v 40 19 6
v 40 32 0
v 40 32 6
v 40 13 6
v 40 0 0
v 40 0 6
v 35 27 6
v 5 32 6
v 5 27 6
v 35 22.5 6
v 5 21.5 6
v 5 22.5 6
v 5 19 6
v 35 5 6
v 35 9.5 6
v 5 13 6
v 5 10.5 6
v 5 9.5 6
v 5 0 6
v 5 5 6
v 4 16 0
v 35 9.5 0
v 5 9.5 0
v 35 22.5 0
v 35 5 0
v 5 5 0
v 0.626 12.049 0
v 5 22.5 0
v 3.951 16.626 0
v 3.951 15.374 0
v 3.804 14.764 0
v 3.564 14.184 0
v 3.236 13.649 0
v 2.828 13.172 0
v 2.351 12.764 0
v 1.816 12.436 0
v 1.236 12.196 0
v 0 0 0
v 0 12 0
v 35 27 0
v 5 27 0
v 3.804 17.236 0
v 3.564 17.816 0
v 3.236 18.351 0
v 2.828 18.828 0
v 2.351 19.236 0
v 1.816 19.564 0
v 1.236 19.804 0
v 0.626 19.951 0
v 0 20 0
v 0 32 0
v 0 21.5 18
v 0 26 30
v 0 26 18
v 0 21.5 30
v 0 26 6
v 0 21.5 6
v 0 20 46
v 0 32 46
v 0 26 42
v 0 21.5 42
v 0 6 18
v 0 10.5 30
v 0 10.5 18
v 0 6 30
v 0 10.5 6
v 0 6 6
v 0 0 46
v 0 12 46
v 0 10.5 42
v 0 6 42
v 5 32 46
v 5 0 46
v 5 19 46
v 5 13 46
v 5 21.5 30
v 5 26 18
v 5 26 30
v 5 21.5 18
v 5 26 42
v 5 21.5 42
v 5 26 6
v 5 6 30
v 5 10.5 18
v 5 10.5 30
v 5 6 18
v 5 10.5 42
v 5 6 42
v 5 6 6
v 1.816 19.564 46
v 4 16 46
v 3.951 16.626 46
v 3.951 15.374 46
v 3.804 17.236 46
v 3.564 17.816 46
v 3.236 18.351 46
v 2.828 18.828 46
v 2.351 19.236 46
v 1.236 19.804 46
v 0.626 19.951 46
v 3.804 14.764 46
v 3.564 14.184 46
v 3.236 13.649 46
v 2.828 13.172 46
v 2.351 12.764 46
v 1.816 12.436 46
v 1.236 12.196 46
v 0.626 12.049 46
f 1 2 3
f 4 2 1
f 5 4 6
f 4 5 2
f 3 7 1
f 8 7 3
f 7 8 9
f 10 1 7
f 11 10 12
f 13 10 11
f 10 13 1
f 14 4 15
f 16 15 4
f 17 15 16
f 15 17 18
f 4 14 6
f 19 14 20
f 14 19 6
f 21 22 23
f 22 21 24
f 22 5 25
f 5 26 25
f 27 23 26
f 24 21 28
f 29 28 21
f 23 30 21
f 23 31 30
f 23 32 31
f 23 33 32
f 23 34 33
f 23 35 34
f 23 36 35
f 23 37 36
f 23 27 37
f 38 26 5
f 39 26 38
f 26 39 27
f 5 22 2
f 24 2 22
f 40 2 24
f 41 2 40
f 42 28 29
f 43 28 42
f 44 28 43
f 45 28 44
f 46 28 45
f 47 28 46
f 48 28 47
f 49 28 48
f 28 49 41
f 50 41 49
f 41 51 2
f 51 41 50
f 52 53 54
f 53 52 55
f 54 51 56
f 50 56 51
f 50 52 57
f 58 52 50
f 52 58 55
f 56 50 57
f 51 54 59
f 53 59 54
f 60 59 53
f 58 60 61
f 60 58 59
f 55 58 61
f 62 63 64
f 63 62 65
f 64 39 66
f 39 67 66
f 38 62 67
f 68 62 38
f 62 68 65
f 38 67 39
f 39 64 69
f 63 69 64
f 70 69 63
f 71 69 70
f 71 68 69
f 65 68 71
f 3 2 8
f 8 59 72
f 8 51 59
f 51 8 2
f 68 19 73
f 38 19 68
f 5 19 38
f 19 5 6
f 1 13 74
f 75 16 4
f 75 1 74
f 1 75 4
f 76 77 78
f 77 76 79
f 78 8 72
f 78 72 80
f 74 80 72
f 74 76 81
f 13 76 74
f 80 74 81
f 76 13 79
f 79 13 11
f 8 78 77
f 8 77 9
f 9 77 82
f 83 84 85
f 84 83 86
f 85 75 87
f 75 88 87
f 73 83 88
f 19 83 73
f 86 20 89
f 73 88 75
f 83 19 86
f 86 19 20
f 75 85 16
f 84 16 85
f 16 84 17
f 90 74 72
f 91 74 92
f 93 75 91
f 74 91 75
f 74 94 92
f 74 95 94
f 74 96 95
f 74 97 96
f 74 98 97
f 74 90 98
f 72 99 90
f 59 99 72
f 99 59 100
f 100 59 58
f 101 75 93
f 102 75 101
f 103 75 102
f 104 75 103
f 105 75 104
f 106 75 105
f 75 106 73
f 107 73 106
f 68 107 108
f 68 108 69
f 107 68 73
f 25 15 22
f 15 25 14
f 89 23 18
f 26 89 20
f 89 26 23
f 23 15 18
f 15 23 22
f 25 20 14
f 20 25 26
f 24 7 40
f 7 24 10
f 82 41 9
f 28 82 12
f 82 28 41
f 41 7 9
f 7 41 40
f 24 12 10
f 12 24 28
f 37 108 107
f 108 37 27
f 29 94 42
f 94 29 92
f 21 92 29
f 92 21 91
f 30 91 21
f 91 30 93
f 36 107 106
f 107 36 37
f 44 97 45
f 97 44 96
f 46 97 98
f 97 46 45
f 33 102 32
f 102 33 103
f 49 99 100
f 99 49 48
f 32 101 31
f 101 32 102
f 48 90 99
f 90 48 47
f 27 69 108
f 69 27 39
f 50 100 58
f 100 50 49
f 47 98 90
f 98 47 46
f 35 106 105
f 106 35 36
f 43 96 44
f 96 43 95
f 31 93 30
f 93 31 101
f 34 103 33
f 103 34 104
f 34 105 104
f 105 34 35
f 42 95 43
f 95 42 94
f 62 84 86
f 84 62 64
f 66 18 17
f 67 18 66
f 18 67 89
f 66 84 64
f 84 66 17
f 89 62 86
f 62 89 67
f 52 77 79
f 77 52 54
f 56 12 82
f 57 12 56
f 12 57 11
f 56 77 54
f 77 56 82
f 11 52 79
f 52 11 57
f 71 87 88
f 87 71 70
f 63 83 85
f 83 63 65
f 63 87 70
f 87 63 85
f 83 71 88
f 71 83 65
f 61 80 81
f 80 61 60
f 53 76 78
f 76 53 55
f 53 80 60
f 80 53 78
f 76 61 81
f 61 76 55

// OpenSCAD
// file: gear.scad
module gear (
	mm_per_tooth    = 3,    //this is the "circular pitch", the circumference of the pitch circle divided by the number of teeth
	number_of_teeth = 11,   //total number of teeth around the entire perimeter
	thickness       = 6,    //thickness of gear in mm
	hole_diameter   = 3,    //diameter of the hole in the center, in mm
	twist           = 0,    //teeth rotate this many degrees from bottom of gear to top.  360 makes the gear a screw with each thread going around once
	teeth_to_hide   = 0,    //number of teeth to delete to make this only a fraction of a circle
	pressure_angle  = 28,   //Controls how straight or bulged the tooth sides are. In degrees.
	clearance       = 0.0,  //gap between top of a tooth on one gear and bottom of valley on a meshing gear (in millimeters)
	backlash        = 0.0   //gap between two meshing teeth, in the direction along the circumference of the pitch circle
) {
	pi = 3.1415926;
	p  = mm_per_tooth * number_of_teeth / pi / 2;  //radius of pitch circle
	c  = p + mm_per_tooth / pi - clearance;       //radius of outer circle
	b  = p*cos(pressure_angle);                    //radius of base circle
	r  = p-(c-p)-clearance;                        //radius of root circle
	t  = mm_per_tooth/2-backlash/2;                //tooth thickness at pitch circle
	k  = -iang(b, p) - t/2/p/pi*180;
    {             //angle to where involute meets base circle on each side of tooth
		difference() {
			for (i = [0:number_of_teeth-teeth_to_hide-1] )
				rotate([0,0,i*360/number_of_teeth])
					linear_extrude(height = thickness, center = true, convexity = 10, twist = twist)
						polygon(
							points=[
								[0, -hole_diameter/10],
								polar(r, -181/number_of_teeth),
								polar(r, r<b ? k : -180/number_of_teeth),
								q7(0/5,r,b,c,k, 1),q7(1/5,r,b,c,k, 1),q7(2/5,r,b,c,k, 1),q7(3/5,r,b,c,k, 1),q7(4/5,r,b,c,k, 1),q7(5/5,r,b,c,k, 1),
								q7(5/5,r,b,c,k,-1),q7(4/5,r,b,c,k,-1),q7(3/5,r,b,c,k,-1),q7(2/5,r,b,c,k,-1),q7(1/5,r,b,c,k,-1),q7(0/5,r,b,c,k,-1),
								polar(r, r<b ? -k : 180/number_of_teeth),
								polar(r, 181/number_of_teeth)
							],
 							paths=[[0,1,2,3,4,5,6,7,8,9,10,11,12,13,14,15,16]]
						);
			cylinder(h=2*thickness+1, r=hole_diameter/2, center=true, $fn=20);
		}
	}
};	
//these 4 functions are used by gear
function polar(r,theta)   = r*[sin(theta), cos(theta)];                            //convert polar to cartesian coordinates
function iang(r1,r2)      = sqrt((r2/r1)*(r2/r1) - 1)/3.1415926*180 - acos(r1/r2); //unwind a string this many degrees to go from radius r1 to radius r2
function q7(f,r,b,r2,t,s) = q6(b,s,t,(1-f)*max(b,r)+f*r2);                         //radius a fraction f up the curved side of the tooth 
function q6(b,s,t,d)      = polar(d,s*(iang(b,d)+t));                              //point at radius d on the involute curve

//a rack, which is a straight line with teeth (the same as a segment from a giant gear with a huge number of teeth).
//The "pitch circle" is a line along the X axis.
module rack (
	mm_per_tooth    = 3,    //this is the "circular pitch", the circumference of the pitch circle divided by the number of teeth
	number_of_teeth = 11,   //total number of teeth along the rack
	thickness       = 6,    //thickness of rack in mm (affects each tooth)
	height          = 120,   //height of rack in mm, from tooth top to far side of rack.
	pressure_angle  = 28,   //Controls how straight or bulged the tooth sides are. In degrees.
	backlash        = 0.0   //gap between two meshing teeth, in the direction along the circumference of the pitch circle
) {
	pi = 3.1415926;
	a = mm_per_tooth / pi; //addendum
	t = a*cos(pressure_angle)-1;         //tooth side is tilted so top/bottom corners move this amount
		for (i = [0:number_of_teeth-1] )
			translate([i*mm_per_tooth,0,0])
				linear_extrude(height = thickness, center = true, convexity = 10)
					polygon(
						points=[
							[-mm_per_tooth * 3/4,                 a-height],
							[-mm_per_tooth * 3/4 - backlash,     -a],
							[-mm_per_tooth * 1/4 + backlash - t, -a],
							[-mm_per_tooth * 1/4 + backlash + t,  a],
							[ mm_per_tooth * 1/4 - backlash - t,  a],
							[ mm_per_tooth * 1/4 - backlash + t, -a],
							[ mm_per_tooth * 3/4 + backlash,     -a],
							[ mm_per_tooth * 3/4,                 a-height],
						],
						paths=[[0,1,2,3,4,5,6,7]]
					);
};	

//These 5 functions let the user find the derived dimensions of the gear.
//A gear fits within a circle of radius outer_radius, and two gears should have
//their centers separated by the sum of their pictch_radius.
function circular_pitch  (mm_per_tooth=3) = mm_per_tooth;                     //tooth density expressed as "circular pitch" in millimeters
function diametral_pitch (mm_per_tooth=3) = 3.1415926 / mm_per_tooth;         //tooth density expressed as "diametral pitch" in teeth per millimeter
function module_value    (mm_per_tooth=3) = mm_per_tooth / pi;                //tooth density expressed as "module" or "modulus" in millimeters
function pitch_radius    (mm_per_tooth=3,number_of_teeth=11) = mm_per_tooth * number_of_teeth / 3.1415926 / 2;
function outer_radius    (mm_per_tooth=3,number_of_teeth=11,clearance=0.1)    //The gear fits entirely within a cylinder of this radius.
	= mm_per_tooth*(1+number_of_teeth/2)/3.1415926  - clearance;              
// file: utils.scad
use <gear.scad>
module intHoles(){
    linear_extrude(5){
        translate([0,0])circle(r=2.25,$fn=20);
        translate([30,0])circle(r=2.25,$fn=20);
        translate([0,30])circle(r=2.25,$fn=20);
        translate([30,30])circle(r=2.25,$fn=20);
    }
}
module cone1(){
    cylinder(r1=8/2,r2=3.5/2,h=3,$fn=20);
}
module motorHole(x=0.15){
    //mini motor
    difference(){
        circle(r=1.45+x,$fn=30);
        translate([0.9+1.5+2*x,0])square([3,3],center=true);
    }
}
module gearSection(a,n,h,r=0){
    intersection(){
        translate([0,0,h/2])rotate([0,0,r])gear(3.13,n,h,0);
        linear_extrude(h)polygon(points=[[0,0],[100,0],
        [100*cos(a/5),100*sin(a/5)],
        [100*cos(2*a/5),100*sin(2*a/5)],[100*cos(3*a/5),100*sin(3*a/5)],
        [100*cos(4*a/5),100*sin(4*a/5)],[100*cos(a),100*sin(a)]]);
    }
}
module semicircle(r1,r2){
    difference(){
        circle(r=r2,$fn=50);
        translate([-r2,-r2])square([2*r2,r2]);
        circle(r=r1,$fn=50);
    }
}
module arc(r1,r2,x){
    intersection(){
        semicircle(r1,r2);
        rotate(180+x)semicircle(r1,r2);
    }
}
module littleMotor(){
    cube([12,25,10]);
    translate([6,25,5])rotate([-90,0,0])linear_extrude(10)motorHole();
}
module bolt(){
    cylinder(r=2.25,h=25,$fn=20);
}
module dmotorHole(x=0.1){
    difference(){
        circle(r=2+x,$fn=25);
        translate([3.4-2+x,-2.5])square([3,5]);
    }
}
// main file
include <utils.scad>
/*
module a(){
    circle(r=80,$fn=80);
}

module b(){
    for(i=[0:4]){
        rotate([0,0,i*72])
        translate([70,0,0])
        square([70,30],center=true);            
    }
}
module c(){
    for(i=[0:4]){
        rotate([0,0,i*72]){
            translate([70,-20])
            circle(r=2.25,$fn=20);
            translate([70,20])
            circle(r=2.25,$fn=20);
        }
    }
}

module base(){
difference(){
    linear_extrude(4)a();
    union(){
        translate([0,0,4-2])linear_extrude(2)b();
        linear_extrude(5)c();
        cylinder(r=2.25,h=5,$fn=20);
    }
}
}
module a2(){
    difference(){
        square([50.5,22]);
        translate([15.25,10])square([20,9]);
}}

module b2(){
    difference(){
        a2();
        translate([5.75,11])circle(r=2.25,$fn=20);
}
}

module c2(){
    difference(){
        b2();
        translate([45.75,11])circle(r=2.25,$fn=20);
    }}
module partV(){
    //photointerrupter card thing
    difference(){
        cube([25,11,2]);
        translate([5,5,0])cylinder(r=2.1,h=2,$fn=30);
        translate([20,5,0])cylinder(r=2.1,h=2,$fn=30);
        translate([5,5-2.1,0])cube([15,4.2,2]);
    }
    translate([12.5-3,11,0])cube([6,2,5]);
}
module partW(){
    //cable holder for rev
    difference(){
        cube([14,8,8]);
        translate([2,0,0])cube([3,8,6]);
        translate([8,0,2])cube([3,8,4]);
        translate([10,0,0])cube([2,8,3]);
        translate([12,0,0])cube([2,8,1.5]);
    }
}
r1 = 31;
w = 3;
h = 20;

module servo(){
    translate([0,-11.75-w,-10])difference(){
        cube([12.5+2*w,23.5+2*w,30]);
        translate([w,w,0])cube([12.5,23.5,30]);
        translate([3+w,23.5+w,0])cube([12.5-2*3,w,10]);
        translate([3,23.5+w-1,0])rotate([0,-45,0])cylinder(r=1,h=5,$fn=15);
        translate([12.5+w-1,3,0])rotate([45,0,0])cylinder(r=1,h=5,$fn=15);
    }
}

module holder(){
    difference(){
        union(){
            cylinder(h=h,r=r1+w,$fn=80);
            translate([4+r1+w,0,h-5])cylinder(r=4,h=5,$fn=20);
            translate([r1+w/2+0.875,0,2.5+h-5])cube([w+1.75,4,5],center=true);
        }
        cylinder(h=h,r=r1,$fn=80);
        translate([4+r1+w,0,h-5])cylinder(r=2.25,h=5,$fn=20);
        translate([0,-4-15,0])cube([r1+w,15,h]);
    }
    rotate([0,0,-60])translate([r1,0,0])servo();
    translate([-3,r1,-10])cube([6,w,10]);
}

module bar1(){
    difference(){
        union(){
            cube([10,20,3]);
            translate([5,5,3])cylinder(r=5,h=6,$fn=30);
        }
        translate([5,15,0])cylinder(h=3,r=2.25,$fn=20);
        translate([5,5,6])cylinder(h=6,r=2.4,$fn=20);
    }
}

module bar2(){
    difference(){
        union(){
            cube([8,44,3]);
            translate([0,25,3])cube([8,19,6]);
        }
        translate([4,4,0])cylinder(h=3,r=2.25,$fn=20);
        translate([4,10,0])cylinder(h=3,r=2.25,$fn=20);
        translate([4,30,0])cylinder(h=9,r=2.25,$fn=20);
        translate([4,39,0])cylinder(h=9,r=2.25,$fn=20);
    }
}
module servoTest(){
    linear_extrude(2)difference(){
        translate([-4,-4])square([65,8]);
        for(i=[0:7]){
            translate([i*8,0])circle(r=2.3+i*0.03,$fn=30);
        }
    }
}
*/
module bigGearHoles(){
    for(a=[0:7]){
        rotate([0,0,22.5+45*a])translate([33,0,0])
        cylinder(r=2.25,h=5,$fn=25);
    }
    for(a=[0:3]){
        rotate([0,0,90*a])translate([38,0,0])
        cylinder(r=1.75,h=5,$fn=30);
    }
}

module bigGear(){
    difference(){
        union(){
            translate([0,0,2.5])gear(5,55,5,0);
            cylinder(r=47/2+5,h=15,$fn=80);
        }
        translate([0,0,2])cylinder(r=47/2+0.1,h=13,$fn=80);
        cylinder(r=7.5,h=5,$fn=50);
        bigGearHoles();
    }
}//rotate([180,0,0])bigGear();

module baseA(){
    //base
    difference(){
        union(){
            cube([40,32,6]);
            translate([5,16+3,6])rotate([90,0,0])
            linear_extrude(6)polygon(points=[
            [0,0],[0,40],[35,0]]);
            translate([0,0,6])cube([5,32,40]);
        }
        translate([5,5,0])cube([30,4.5,6]);
        translate([5,27-4.5,0])cube([30,4.5,6]);
        translate([0,16,0])cylinder(r=4,h=46,$fn=40);
        
        translate([0,6,6])cube([5,4.5,12]);
        translate([0,26-4.5,6])cube([5,4.5,12]);
        translate([0,6,30])cube([5,4.5,12]);
        translate([0,26-4.5,30])cube([5,4.5,12]);
    }
}baseA();
    
module baseB(){
    //funny cylinder thing
    difference(){
        union(){
            cylinder(r=25/2,h=16,$fn=60);
            translate([0,-16,0])cube([30,32,4]);
        }
        translate([0,0,4])cylinder(r=8,h=12,$fn=50);
        cylinder(r=5,h=4,$fn=40);
      
        translate([-0.5,15.5/2,4])cylinder(r=4,h=16,$fn=30);
        translate([-0.5,15.5/2,0])cylinder(r=2.25,h=4,$fn=30);
        translate([-0.5,-15.5/2,4])cylinder(r=4,h=16,$fn=30);
        translate([-0.5,-15.5/2,0])cylinder(r=2.25,h=4,$fn=30);
      
        translate([-0.5+24,15.5/2,0])cylinder(r=2.25,h=4,$fn=30);
        translate([-0.5+24,15.5/2,2])cylinder(r=3.5,h=4,$fn=30);
        translate([-0.5+24,-15.5/2,0])cylinder(r=2.25,h=4,$fn=30);
        translate([-0.5+24,-15.5/2,2])cylinder(r=3.5,h=4,$fn=30);
    }
}//baseB();

module baseAB(){
    baseA();
    translate([-0.2,16,12.5])rotate([0,-90,0])
    baseB();
}//baseAB();

module baseABG(){
    baseAB();
    translate([-5-14-0.4,16,12.5])rotate([0,90,0])
    bigGear();
}//baseABG();

module littleGear(){
    difference(){
        translate([0,0,2.5])gear(5,9,5,0);
        difference(){
            cylinder(r=3,h=5,$fn=40);
            translate([3-0.7,-5,0])cube([5,10,5]);
        }
    }
}//littleGear();

module baseC(){
    //holds motor
    difference(){
        union(){
            cube([24,68,9]);
            translate([0,34-23,0])cube([24,46,46]);
        }
        translate([0,34,23])rotate([0,90,0])
        cylinder(r=37/2+0.2,h=24,$fn=80);
        
        translate([0,34,4.5])cube([24,34,1.5]);
        
        translate([5,63,0])cylinder(r=2.25,h=9,$fn=25);
        translate([19,63,0])cylinder(r=2.25,h=9,$fn=25);
        translate([5,5,0])cylinder(r=2.25,h=9,$fn=25);
        translate([19,5,0])cylinder(r=2.25,h=9,$fn=25);
    }
}//baseC();

module baseCG(){
    baseC();
    a=90;
    translate([-14,34+8*sin(a),23+8*cos(a)])rotate([0,-90,0])
    littleGear();
}//baseCG();

module baseAll(){
    translate([0,-75-16,0])baseCG();
    translate([0,-16,0])baseABG();
}//baseAll();

module photoGuide(){
    difference(){
        cube([30,9,6]);
        translate([15-2.5,4.5-3.5,0])cube([5,7,6]);
        translate([0,0,1.7])linear_extrude(4.3){
            polygon(points=[
            [0,0],[12.5,4.5-1.6],[17.5,4.5-1.6],[30,0],
            [30,9],[17.5,4.5+1.6],[12.5,4.5+1.6],[0,9]]);
        }
    }
}//photoGuide();

module holderA(){
    //sliding section
    a=atan((36-27)/115);
    translate([6,-10,0])difference(){
        union(){
            translate([8,0,0])cube([30-8,20,3]);
            translate([3,3.72+10,11.5/2])rack(4,7,11.5,5);
            translate([0,10,0])mirror([0,1,0])
            translate([3-4/2,3.72,11.5/2])rack(4,8,11.5,5);
            translate([27+3-6,7.5,11.5])cube([6,5,8]);
            translate([24,7.5,11.5+8])rotate([0,a,0])
            cube([6,5,10]);
        }
        translate([-3,0,0])cube([3,20,20]);
        translate([30,0,0])cube([3,20,20]);
        translate([30,7.5,11.5+8])cube([6,5,10]);
        
        translate([30-3,0,15])rotate([-90,0,0])
        cylinder(r=1,h=20,$fn=25);
    }
}//holderA();

module holderB(){
    //gears
    n=15;
    difference(){
        union(){
            //cylinder(r=2.5,h=3+4.5,$fn=30);
            translate([0,0,3+4.5+2])gear(4,n,4,0);
        }
        cylinder(r=1.75,h=3+4.5+4,$fn=25);
    }
}//holderB();

module holderC(){
    //slider cover
    dy=4;
    dx=19.5;
    ds=10.2;
    a=atan((dy+10)/dx);
    d=sqrt(pow(dy+10,2)+pow(dx,2));
    x=30;
    difference(){
            translate([ds/tan(60),ds,0])union(){
            linear_extrude(3.2){
                polygon(points=[[0,0],[x,0],
                [24*cos(60),24*sin(60)],
                [x*cos(120),x*sin(120)]]);
            }
            o=4;
            translate([0,0,3.2])linear_extrude(3.7){
                polygon(points=[[0,-o],[x,-o],[x,0],
                [24*cos(60),24*sin(60)],
                [x*cos(120),x*sin(120)],
                [x*cos(120)-o*sin(120),x*sin(120)+o*cos(120)],
                [-o*sin(120),o*cos(120)]]);
            }
        }
        rotate([0,0,a])translate([d,0,0])
        cylinder(r=1.75,h=7,$fn=25);
        rotate([0,0,120-a])translate([d,0,0])
        cylinder(r=1.75,h=7,$fn=25);
        
        rotate([0,0,60])translate([32.5,0,0])
        cylinder(r=1.75,h=7,$fn=25);
        rotate([0,0,60])translate([11,0,0])
        cylinder(r=1.75,h=7,$fn=25);
    }
}//holderC();

module holderD(){
    //cam for pushing arm
    rotate([0,0,0])difference(){
        scale([1,0.5,1])translate([4,0,0])
        cylinder(r=12,h=6,$fn=40);
        cylinder(r=2.3,h=6,$fn=30);
        translate([8,0,0])cylinder(r=1,h=6,$fn=25);
        translate([8,0,0])cylinder(r=2,h=3,$fn=30);
    }
}//holderD();

module holderE(){
    dy=4;
    dx=19.5;
    a=atan((dy+10)/dx);
    d=sqrt(pow(dy+10,2)+pow(dx,2));
    //base plate for individual grabber
    difference(){
        linear_extrude(4){
            polygon(points=[
                [20,0],[27,16],[40,24],[61,36],
                [88,31],[105,11],
                [105,-11],[88,-31],[50,-40],[35,-50],[15,-25]
            ]);
        }
        rotate([0,0,22.5])translate([33,0,0])
        cylinder(r=2.25,h=4,$fn=30);
        rotate([0,0,-22.5])translate([33,0,0])
        cylinder(r=2.25,h=4,$fn=30);
            
        translate([70,0,0]){
            for(i=[0:2]){
                rotate([0,0,i*120+a])translate([d,0,0])
                cylinder(r1=3.5,r2=1.75,h=4,$fn=25);
                rotate(i*120+120-a)translate([d,0,0])
                cylinder(r1=3.5,r2=1.75,h=4,$fn=25);
                 
                rotate([0,0,i*120+60])translate([32.5,0,0])
                cylinder(r1=3.5,r2=1.75,h=4,$fn=25);
                rotate([0,0,i*120+60])translate([11,0,0])
                cylinder(r1=3.5,r2=1.75,h=4,$fn=25);
            }

        }
    }
    linear_extrude(10)polygon(points=[
        [40,-46.5],[35,-50],[25.5,-38]
    ]);
}//holderE();

module holderABC(){
    translate([-3,0,0])holderA();
    dy=4;
    dx=19.5;
    ds=10.2;
    translate([dx,-10-dy,0])rotate([0,0,180/15])
    holderB();
    translate([dx,dy+10,0])rotate([0,0,180/15])
    holderB();
    holderC();
}//holderABC();

module holderABC2(){
    rotate([0,0,0])holderABC();
    rotate([0,0,120])holderABC();
    rotate([0,0,240])holderABC();
}//holderABC2();

module holderABCD(){
    holderABC2();
    translate([-44.7,27.4,4])rotate([0,0,100])
    translate([-16,-4,0])holderD1();
}

module holderAll(){
    for(i=[0,90,180,270]){
        union(){
        rotate([0,0,i]){
        translate([70,0,0])holderABC2();
        translate([25,-24,0])rotate([90,0,-30])union(){
            cube([27,23,12]);
            translate([27.2,7,6])rotate([0,90,0])
            holderD();
        }
        translate([0,0,-4.5])holderE();
        }
    }
    }
    
}//translate([0,0,5])holderAll();

module stopperA(){
    //base
    difference(){
        union(){
            cube([45,30,4]);
            cube([8,30,45]);
            //translate([0,15-2,0])cube([25,4,45]);
        }
        translate([0,15-10,32])cube([8,20,8]);
        
        translate([13,5-2.25,0])cube([27,4.5,h]);
        translate([13,25-2.25,0])cube([27,4.5,h]);
        translate([13,5,0])cylinder(r=2.25,h=4,$fn=25);
        translate([40,5,0])cylinder(r=2.25,h=4,$fn=25);
        translate([13,25,0])cylinder(r=2.25,h=4,$fn=25);
        translate([40,25,0])cylinder(r=2.25,h=4,$fn=25);
        
        translate([0,5,25])rotate([0,90,0])
        cylinder(r=2.25,h=8,$fn=25);
        translate([0,25,25])rotate([0,90,0])
        cylinder(r=2.25,h=8,$fn=25);
    }
}//stopperA();

module stopperB(){
    //underside of base
    h = 20;
    //translate([16,15,3])cylinder(r1=6,r2=0,h=6,$fn=30);
    difference(){
        cube([25,30,h+3]);
        translate([10,0,3])cube([15,30,h]);
        translate([5,5,0])cylinder(r=2.25,h=30,$fn=25);
        translate([5,25,0])cylinder(r=2.25,h=30,$fn=25);
        translate([16,15,0])cylinder(r=2.25,h=3,$fn=25);
    }
}//translate([23+8.2,0,20])rotate([0,-90,0])
//stopperB();

module stopperC(){
    //moving bit
    d = 3;
    b = 4;
    difference(){
        union(){
            linear_extrude(7.8)polygon(points=[
                [3,0],[d+b,9.8-3],[b,9.8-3],
                [b,9.8+3],[d+b,9.8+3],[3,19.6]
            ]);
            translate([-8,0,0])cube([11,19.6,7.8]);
            translate([-8-3,-3,0])cube([3,6,7.8]);
            translate([-8-3,17,0])cube([3,6,7.8]);
            translate([-8,9.8,3.9])rotate([0,-90,0])
            cylinder(r1=3.9,r2=0,h=3.9,$fn=30);
        }
    }
}//translate([0,5.1+19.8,32.1])rotate([0,0,180])
//stopperC();
